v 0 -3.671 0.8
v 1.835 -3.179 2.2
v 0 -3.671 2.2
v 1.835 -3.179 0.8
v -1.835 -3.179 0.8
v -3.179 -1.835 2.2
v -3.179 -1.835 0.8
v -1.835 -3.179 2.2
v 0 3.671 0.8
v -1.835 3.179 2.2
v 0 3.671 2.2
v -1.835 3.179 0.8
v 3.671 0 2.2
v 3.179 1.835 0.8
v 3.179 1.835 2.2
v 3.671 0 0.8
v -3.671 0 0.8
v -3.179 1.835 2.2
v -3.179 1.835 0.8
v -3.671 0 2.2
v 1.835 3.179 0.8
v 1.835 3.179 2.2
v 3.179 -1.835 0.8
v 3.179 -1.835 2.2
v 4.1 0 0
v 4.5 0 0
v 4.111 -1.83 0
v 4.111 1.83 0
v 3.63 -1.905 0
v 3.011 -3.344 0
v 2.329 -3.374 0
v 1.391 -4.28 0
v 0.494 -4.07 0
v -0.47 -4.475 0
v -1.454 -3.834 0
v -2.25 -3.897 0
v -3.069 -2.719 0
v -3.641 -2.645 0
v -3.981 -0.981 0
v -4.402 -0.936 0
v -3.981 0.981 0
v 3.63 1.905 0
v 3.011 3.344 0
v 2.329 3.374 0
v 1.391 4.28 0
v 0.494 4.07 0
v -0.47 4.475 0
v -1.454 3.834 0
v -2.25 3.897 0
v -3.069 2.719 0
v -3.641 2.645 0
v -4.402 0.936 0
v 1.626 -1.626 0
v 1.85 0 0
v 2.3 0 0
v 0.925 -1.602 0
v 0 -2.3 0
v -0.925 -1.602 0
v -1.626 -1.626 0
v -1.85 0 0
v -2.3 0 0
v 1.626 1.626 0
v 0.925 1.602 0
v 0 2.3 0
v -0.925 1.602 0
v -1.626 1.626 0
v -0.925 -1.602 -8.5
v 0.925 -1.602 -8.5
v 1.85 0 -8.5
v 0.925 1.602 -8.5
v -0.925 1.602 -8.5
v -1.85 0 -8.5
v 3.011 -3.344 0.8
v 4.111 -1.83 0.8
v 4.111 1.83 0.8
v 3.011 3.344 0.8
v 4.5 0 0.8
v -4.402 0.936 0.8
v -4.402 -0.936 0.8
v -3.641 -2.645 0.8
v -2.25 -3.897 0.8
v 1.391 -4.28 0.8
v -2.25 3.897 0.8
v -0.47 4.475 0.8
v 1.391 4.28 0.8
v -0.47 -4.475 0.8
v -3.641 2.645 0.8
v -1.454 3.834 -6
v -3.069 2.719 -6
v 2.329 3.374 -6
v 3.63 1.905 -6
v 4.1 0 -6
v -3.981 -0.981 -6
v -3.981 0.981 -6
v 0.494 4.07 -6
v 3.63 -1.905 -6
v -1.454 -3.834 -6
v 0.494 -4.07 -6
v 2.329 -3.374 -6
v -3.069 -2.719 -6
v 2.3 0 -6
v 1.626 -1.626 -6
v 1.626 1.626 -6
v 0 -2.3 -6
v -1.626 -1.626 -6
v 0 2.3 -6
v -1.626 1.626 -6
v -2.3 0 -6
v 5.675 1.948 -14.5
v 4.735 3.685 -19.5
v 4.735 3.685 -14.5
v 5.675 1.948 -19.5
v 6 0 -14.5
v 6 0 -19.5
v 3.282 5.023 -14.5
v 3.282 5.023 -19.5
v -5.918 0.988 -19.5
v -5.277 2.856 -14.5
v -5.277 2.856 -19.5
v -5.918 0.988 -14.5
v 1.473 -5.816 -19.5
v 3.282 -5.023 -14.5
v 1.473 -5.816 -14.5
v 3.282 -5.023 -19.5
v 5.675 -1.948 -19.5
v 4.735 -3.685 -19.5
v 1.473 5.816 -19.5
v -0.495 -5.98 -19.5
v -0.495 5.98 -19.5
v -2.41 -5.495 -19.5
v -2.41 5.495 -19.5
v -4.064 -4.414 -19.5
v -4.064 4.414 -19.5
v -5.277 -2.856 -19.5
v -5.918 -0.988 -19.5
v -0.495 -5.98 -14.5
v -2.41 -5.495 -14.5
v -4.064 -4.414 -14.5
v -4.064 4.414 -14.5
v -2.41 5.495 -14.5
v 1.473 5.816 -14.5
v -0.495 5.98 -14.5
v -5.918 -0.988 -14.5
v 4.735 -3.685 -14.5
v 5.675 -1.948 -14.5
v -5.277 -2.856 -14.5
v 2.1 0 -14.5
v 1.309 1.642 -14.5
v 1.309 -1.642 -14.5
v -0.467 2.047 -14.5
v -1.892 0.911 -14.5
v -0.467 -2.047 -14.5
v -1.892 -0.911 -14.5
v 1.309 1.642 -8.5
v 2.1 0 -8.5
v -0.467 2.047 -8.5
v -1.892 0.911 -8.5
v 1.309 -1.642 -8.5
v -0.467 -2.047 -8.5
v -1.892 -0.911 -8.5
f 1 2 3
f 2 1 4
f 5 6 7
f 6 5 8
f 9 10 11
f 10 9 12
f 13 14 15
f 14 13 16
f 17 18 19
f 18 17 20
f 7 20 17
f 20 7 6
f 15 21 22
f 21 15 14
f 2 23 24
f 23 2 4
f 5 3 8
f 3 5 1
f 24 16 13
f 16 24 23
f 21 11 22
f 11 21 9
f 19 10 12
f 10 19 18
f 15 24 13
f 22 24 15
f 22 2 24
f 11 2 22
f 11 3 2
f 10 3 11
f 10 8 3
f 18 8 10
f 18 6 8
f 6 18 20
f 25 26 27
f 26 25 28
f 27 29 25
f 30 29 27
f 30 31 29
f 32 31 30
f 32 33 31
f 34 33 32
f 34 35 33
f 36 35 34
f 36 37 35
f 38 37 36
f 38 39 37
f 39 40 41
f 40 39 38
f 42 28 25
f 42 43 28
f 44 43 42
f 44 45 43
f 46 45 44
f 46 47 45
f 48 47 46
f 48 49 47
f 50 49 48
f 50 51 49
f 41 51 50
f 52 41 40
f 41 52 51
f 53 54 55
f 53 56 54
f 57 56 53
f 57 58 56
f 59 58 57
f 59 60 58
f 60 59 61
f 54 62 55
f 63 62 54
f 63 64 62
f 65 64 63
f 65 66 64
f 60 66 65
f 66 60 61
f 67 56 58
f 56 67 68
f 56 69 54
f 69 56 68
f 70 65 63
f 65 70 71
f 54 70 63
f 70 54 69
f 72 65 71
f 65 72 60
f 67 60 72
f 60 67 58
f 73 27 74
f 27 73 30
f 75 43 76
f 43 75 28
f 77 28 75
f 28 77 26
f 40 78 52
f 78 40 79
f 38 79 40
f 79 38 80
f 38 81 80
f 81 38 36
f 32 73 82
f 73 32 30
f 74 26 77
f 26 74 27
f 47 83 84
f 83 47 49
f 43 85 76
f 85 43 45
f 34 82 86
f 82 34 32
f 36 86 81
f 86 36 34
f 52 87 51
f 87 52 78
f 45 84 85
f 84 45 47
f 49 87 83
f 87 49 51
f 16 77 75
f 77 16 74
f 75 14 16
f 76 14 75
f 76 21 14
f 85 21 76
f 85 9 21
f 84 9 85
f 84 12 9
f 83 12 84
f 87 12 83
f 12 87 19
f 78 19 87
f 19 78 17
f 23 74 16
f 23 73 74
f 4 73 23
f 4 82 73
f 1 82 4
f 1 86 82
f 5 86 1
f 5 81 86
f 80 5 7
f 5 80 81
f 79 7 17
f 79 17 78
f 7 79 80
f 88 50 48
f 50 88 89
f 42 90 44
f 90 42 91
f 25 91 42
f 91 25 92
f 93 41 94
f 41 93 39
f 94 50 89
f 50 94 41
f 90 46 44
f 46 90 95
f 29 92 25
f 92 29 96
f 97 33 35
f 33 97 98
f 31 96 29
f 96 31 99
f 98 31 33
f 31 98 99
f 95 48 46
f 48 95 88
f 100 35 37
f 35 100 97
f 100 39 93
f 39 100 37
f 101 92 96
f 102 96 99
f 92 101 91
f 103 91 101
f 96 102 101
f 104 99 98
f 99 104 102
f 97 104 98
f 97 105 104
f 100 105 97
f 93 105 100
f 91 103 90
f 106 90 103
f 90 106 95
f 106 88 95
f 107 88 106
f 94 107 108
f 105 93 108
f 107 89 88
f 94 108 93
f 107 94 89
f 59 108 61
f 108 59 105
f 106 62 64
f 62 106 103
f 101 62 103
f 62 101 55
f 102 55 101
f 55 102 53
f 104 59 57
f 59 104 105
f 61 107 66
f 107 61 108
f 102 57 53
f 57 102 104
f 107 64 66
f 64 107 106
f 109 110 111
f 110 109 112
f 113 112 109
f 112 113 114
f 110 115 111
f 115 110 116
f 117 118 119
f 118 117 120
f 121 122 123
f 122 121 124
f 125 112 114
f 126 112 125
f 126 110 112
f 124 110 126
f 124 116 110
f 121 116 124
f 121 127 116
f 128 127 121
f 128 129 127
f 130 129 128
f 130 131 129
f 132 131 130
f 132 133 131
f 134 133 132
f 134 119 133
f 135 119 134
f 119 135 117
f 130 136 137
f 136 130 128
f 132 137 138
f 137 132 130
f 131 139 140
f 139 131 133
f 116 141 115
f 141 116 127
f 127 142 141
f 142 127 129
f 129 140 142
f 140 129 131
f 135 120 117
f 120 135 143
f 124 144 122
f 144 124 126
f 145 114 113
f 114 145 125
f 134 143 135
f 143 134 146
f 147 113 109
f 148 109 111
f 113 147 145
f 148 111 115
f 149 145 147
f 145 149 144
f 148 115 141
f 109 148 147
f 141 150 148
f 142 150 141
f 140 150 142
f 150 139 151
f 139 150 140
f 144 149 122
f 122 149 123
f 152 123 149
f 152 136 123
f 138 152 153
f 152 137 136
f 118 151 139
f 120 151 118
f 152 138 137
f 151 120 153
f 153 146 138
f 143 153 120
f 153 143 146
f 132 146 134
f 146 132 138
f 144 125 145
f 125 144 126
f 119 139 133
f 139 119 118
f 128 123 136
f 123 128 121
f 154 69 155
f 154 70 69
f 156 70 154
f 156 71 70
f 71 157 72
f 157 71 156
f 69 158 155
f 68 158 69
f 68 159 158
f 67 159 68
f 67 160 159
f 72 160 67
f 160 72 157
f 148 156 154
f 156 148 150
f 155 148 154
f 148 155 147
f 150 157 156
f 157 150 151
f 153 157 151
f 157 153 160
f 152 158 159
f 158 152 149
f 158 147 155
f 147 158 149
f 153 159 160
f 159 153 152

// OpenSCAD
// Parameters
thread_diameter = 4.0; //[2.0:8.0:0.1]
length = 10.0; //[5.0:20.0:0.5]
head_diameter = 7.6; //[4.0:15.2:0.1]
head_height = 2.2; //[1.1:4.4:0.1]
socket_af = 2.5; //[1.5:4.0:0.1]
socket_depth = 1.6; //[0.8:3.2:0.1]
tip_length = 1.2; //[0.6:2.4:0.1]
thread_relief = 0.15; //[0.05:0.4:0.01]
overlap = 0.8; //[0.3:2.0:0.1]
washer_outer_diameter = 9.0; //[6.0:18.0:0.1]
washer_thickness = 0.8; //[0.4:2.0:0.1]
washer_hole_diameter = 4.4; //[4.1:6.0:0.1]
spacer_height = 6.0; //[3.0:12.0:0.5]
spacer_wall = 1.8; //[0.9:3.6:0.1]
spacer_clearance_diameter = 4.6; //[4.2:6.5:0.1]
buzzer_diameter = 12.0; //[6.0:24.0:0.5]
buzzer_height = 5.0; //[2.5:10.0:0.5]
buzzer_post_diameter = 4.2; //[3.0:6.0:0.1]

// PCB Spacer - complete geometry
module pcb_spacer() {
  color([0.85, 0.85, 0.8]) {
    difference() {
      cylinder(r=spacer_clearance_diameter/2 + spacer_wall, h=spacer_height, center=true);
      translate([0, 0, -overlap])
        cylinder(r=spacer_clearance_diameter/2, h=spacer_height + overlap*2, center=true);
    }
  }
}

// Screw and Washer - complete geometry
module screw_and_washer() {
  color("DimGray") {
    // Threaded shaft
    translate([0, 0, -length/2])
      cylinder(r=thread_diameter/2 - thread_relief, h=length, center=true);
    // Tip end
    translate([0, 0, -length - tip_length/2 + overlap])
      cylinder(r1=thread_diameter/2 - thread_relief, r2=0, h=tip_length, center=true);
    // Dome head
    intersection() {
      translate([0, 0, head_diameter/2 - head_height])
        sphere(r=head_diameter/2, center=true);
      translate([0, 0, head_height/2])
        cube([head_diameter*2, head_diameter*2, head_height], center=true);
    }
    // Hex socket recess
    translate([0, 0, head_height - socket_depth/2])
      rotate([0, 0, 0])
      cylinder(r=socket_af/(2*cos(30)), h=socket_depth, center=true);
  }
  color("Silver") {
    // Washer
    difference() {
      translate([0, 0, -washer_thickness/2 + overlap])
        cylinder(r=washer_outer_diameter/2, h=washer_thickness, center=true);
      translate([0, 0, -washer_thickness/2 + overlap])
        cylinder(r=washer_hole_diameter/2, h=washer_thickness + overlap*2, center=true);
    }
  }
}

// Buzzer - complete geometry
module buzzer() {
  color([0.1, 0.1, 0.6]) {
    // Buzzer body
    translate([0, 0, -washer_thickness - spacer_height - buzzer_height/2 + overlap])
      cylinder(r=buzzer_diameter/2, h=buzzer_height, center=true);
    // Buzzer post
    translate([0, 0, -washer_thickness - spacer_height/2 + overlap])
      cylinder(r=buzzer_post_diameter/2, h=spacer_height, center=true);
  }
}

// Assembly
module assembly() {
  screw_and_washer();
  translate([0, 0, -washer_thickness - spacer_height/2 + overlap])
    pcb_spacer();
  translate([0, 0, -washer_thickness - spacer_height - buzzer_height/2 + overlap])
    buzzer();
}

assembly();
